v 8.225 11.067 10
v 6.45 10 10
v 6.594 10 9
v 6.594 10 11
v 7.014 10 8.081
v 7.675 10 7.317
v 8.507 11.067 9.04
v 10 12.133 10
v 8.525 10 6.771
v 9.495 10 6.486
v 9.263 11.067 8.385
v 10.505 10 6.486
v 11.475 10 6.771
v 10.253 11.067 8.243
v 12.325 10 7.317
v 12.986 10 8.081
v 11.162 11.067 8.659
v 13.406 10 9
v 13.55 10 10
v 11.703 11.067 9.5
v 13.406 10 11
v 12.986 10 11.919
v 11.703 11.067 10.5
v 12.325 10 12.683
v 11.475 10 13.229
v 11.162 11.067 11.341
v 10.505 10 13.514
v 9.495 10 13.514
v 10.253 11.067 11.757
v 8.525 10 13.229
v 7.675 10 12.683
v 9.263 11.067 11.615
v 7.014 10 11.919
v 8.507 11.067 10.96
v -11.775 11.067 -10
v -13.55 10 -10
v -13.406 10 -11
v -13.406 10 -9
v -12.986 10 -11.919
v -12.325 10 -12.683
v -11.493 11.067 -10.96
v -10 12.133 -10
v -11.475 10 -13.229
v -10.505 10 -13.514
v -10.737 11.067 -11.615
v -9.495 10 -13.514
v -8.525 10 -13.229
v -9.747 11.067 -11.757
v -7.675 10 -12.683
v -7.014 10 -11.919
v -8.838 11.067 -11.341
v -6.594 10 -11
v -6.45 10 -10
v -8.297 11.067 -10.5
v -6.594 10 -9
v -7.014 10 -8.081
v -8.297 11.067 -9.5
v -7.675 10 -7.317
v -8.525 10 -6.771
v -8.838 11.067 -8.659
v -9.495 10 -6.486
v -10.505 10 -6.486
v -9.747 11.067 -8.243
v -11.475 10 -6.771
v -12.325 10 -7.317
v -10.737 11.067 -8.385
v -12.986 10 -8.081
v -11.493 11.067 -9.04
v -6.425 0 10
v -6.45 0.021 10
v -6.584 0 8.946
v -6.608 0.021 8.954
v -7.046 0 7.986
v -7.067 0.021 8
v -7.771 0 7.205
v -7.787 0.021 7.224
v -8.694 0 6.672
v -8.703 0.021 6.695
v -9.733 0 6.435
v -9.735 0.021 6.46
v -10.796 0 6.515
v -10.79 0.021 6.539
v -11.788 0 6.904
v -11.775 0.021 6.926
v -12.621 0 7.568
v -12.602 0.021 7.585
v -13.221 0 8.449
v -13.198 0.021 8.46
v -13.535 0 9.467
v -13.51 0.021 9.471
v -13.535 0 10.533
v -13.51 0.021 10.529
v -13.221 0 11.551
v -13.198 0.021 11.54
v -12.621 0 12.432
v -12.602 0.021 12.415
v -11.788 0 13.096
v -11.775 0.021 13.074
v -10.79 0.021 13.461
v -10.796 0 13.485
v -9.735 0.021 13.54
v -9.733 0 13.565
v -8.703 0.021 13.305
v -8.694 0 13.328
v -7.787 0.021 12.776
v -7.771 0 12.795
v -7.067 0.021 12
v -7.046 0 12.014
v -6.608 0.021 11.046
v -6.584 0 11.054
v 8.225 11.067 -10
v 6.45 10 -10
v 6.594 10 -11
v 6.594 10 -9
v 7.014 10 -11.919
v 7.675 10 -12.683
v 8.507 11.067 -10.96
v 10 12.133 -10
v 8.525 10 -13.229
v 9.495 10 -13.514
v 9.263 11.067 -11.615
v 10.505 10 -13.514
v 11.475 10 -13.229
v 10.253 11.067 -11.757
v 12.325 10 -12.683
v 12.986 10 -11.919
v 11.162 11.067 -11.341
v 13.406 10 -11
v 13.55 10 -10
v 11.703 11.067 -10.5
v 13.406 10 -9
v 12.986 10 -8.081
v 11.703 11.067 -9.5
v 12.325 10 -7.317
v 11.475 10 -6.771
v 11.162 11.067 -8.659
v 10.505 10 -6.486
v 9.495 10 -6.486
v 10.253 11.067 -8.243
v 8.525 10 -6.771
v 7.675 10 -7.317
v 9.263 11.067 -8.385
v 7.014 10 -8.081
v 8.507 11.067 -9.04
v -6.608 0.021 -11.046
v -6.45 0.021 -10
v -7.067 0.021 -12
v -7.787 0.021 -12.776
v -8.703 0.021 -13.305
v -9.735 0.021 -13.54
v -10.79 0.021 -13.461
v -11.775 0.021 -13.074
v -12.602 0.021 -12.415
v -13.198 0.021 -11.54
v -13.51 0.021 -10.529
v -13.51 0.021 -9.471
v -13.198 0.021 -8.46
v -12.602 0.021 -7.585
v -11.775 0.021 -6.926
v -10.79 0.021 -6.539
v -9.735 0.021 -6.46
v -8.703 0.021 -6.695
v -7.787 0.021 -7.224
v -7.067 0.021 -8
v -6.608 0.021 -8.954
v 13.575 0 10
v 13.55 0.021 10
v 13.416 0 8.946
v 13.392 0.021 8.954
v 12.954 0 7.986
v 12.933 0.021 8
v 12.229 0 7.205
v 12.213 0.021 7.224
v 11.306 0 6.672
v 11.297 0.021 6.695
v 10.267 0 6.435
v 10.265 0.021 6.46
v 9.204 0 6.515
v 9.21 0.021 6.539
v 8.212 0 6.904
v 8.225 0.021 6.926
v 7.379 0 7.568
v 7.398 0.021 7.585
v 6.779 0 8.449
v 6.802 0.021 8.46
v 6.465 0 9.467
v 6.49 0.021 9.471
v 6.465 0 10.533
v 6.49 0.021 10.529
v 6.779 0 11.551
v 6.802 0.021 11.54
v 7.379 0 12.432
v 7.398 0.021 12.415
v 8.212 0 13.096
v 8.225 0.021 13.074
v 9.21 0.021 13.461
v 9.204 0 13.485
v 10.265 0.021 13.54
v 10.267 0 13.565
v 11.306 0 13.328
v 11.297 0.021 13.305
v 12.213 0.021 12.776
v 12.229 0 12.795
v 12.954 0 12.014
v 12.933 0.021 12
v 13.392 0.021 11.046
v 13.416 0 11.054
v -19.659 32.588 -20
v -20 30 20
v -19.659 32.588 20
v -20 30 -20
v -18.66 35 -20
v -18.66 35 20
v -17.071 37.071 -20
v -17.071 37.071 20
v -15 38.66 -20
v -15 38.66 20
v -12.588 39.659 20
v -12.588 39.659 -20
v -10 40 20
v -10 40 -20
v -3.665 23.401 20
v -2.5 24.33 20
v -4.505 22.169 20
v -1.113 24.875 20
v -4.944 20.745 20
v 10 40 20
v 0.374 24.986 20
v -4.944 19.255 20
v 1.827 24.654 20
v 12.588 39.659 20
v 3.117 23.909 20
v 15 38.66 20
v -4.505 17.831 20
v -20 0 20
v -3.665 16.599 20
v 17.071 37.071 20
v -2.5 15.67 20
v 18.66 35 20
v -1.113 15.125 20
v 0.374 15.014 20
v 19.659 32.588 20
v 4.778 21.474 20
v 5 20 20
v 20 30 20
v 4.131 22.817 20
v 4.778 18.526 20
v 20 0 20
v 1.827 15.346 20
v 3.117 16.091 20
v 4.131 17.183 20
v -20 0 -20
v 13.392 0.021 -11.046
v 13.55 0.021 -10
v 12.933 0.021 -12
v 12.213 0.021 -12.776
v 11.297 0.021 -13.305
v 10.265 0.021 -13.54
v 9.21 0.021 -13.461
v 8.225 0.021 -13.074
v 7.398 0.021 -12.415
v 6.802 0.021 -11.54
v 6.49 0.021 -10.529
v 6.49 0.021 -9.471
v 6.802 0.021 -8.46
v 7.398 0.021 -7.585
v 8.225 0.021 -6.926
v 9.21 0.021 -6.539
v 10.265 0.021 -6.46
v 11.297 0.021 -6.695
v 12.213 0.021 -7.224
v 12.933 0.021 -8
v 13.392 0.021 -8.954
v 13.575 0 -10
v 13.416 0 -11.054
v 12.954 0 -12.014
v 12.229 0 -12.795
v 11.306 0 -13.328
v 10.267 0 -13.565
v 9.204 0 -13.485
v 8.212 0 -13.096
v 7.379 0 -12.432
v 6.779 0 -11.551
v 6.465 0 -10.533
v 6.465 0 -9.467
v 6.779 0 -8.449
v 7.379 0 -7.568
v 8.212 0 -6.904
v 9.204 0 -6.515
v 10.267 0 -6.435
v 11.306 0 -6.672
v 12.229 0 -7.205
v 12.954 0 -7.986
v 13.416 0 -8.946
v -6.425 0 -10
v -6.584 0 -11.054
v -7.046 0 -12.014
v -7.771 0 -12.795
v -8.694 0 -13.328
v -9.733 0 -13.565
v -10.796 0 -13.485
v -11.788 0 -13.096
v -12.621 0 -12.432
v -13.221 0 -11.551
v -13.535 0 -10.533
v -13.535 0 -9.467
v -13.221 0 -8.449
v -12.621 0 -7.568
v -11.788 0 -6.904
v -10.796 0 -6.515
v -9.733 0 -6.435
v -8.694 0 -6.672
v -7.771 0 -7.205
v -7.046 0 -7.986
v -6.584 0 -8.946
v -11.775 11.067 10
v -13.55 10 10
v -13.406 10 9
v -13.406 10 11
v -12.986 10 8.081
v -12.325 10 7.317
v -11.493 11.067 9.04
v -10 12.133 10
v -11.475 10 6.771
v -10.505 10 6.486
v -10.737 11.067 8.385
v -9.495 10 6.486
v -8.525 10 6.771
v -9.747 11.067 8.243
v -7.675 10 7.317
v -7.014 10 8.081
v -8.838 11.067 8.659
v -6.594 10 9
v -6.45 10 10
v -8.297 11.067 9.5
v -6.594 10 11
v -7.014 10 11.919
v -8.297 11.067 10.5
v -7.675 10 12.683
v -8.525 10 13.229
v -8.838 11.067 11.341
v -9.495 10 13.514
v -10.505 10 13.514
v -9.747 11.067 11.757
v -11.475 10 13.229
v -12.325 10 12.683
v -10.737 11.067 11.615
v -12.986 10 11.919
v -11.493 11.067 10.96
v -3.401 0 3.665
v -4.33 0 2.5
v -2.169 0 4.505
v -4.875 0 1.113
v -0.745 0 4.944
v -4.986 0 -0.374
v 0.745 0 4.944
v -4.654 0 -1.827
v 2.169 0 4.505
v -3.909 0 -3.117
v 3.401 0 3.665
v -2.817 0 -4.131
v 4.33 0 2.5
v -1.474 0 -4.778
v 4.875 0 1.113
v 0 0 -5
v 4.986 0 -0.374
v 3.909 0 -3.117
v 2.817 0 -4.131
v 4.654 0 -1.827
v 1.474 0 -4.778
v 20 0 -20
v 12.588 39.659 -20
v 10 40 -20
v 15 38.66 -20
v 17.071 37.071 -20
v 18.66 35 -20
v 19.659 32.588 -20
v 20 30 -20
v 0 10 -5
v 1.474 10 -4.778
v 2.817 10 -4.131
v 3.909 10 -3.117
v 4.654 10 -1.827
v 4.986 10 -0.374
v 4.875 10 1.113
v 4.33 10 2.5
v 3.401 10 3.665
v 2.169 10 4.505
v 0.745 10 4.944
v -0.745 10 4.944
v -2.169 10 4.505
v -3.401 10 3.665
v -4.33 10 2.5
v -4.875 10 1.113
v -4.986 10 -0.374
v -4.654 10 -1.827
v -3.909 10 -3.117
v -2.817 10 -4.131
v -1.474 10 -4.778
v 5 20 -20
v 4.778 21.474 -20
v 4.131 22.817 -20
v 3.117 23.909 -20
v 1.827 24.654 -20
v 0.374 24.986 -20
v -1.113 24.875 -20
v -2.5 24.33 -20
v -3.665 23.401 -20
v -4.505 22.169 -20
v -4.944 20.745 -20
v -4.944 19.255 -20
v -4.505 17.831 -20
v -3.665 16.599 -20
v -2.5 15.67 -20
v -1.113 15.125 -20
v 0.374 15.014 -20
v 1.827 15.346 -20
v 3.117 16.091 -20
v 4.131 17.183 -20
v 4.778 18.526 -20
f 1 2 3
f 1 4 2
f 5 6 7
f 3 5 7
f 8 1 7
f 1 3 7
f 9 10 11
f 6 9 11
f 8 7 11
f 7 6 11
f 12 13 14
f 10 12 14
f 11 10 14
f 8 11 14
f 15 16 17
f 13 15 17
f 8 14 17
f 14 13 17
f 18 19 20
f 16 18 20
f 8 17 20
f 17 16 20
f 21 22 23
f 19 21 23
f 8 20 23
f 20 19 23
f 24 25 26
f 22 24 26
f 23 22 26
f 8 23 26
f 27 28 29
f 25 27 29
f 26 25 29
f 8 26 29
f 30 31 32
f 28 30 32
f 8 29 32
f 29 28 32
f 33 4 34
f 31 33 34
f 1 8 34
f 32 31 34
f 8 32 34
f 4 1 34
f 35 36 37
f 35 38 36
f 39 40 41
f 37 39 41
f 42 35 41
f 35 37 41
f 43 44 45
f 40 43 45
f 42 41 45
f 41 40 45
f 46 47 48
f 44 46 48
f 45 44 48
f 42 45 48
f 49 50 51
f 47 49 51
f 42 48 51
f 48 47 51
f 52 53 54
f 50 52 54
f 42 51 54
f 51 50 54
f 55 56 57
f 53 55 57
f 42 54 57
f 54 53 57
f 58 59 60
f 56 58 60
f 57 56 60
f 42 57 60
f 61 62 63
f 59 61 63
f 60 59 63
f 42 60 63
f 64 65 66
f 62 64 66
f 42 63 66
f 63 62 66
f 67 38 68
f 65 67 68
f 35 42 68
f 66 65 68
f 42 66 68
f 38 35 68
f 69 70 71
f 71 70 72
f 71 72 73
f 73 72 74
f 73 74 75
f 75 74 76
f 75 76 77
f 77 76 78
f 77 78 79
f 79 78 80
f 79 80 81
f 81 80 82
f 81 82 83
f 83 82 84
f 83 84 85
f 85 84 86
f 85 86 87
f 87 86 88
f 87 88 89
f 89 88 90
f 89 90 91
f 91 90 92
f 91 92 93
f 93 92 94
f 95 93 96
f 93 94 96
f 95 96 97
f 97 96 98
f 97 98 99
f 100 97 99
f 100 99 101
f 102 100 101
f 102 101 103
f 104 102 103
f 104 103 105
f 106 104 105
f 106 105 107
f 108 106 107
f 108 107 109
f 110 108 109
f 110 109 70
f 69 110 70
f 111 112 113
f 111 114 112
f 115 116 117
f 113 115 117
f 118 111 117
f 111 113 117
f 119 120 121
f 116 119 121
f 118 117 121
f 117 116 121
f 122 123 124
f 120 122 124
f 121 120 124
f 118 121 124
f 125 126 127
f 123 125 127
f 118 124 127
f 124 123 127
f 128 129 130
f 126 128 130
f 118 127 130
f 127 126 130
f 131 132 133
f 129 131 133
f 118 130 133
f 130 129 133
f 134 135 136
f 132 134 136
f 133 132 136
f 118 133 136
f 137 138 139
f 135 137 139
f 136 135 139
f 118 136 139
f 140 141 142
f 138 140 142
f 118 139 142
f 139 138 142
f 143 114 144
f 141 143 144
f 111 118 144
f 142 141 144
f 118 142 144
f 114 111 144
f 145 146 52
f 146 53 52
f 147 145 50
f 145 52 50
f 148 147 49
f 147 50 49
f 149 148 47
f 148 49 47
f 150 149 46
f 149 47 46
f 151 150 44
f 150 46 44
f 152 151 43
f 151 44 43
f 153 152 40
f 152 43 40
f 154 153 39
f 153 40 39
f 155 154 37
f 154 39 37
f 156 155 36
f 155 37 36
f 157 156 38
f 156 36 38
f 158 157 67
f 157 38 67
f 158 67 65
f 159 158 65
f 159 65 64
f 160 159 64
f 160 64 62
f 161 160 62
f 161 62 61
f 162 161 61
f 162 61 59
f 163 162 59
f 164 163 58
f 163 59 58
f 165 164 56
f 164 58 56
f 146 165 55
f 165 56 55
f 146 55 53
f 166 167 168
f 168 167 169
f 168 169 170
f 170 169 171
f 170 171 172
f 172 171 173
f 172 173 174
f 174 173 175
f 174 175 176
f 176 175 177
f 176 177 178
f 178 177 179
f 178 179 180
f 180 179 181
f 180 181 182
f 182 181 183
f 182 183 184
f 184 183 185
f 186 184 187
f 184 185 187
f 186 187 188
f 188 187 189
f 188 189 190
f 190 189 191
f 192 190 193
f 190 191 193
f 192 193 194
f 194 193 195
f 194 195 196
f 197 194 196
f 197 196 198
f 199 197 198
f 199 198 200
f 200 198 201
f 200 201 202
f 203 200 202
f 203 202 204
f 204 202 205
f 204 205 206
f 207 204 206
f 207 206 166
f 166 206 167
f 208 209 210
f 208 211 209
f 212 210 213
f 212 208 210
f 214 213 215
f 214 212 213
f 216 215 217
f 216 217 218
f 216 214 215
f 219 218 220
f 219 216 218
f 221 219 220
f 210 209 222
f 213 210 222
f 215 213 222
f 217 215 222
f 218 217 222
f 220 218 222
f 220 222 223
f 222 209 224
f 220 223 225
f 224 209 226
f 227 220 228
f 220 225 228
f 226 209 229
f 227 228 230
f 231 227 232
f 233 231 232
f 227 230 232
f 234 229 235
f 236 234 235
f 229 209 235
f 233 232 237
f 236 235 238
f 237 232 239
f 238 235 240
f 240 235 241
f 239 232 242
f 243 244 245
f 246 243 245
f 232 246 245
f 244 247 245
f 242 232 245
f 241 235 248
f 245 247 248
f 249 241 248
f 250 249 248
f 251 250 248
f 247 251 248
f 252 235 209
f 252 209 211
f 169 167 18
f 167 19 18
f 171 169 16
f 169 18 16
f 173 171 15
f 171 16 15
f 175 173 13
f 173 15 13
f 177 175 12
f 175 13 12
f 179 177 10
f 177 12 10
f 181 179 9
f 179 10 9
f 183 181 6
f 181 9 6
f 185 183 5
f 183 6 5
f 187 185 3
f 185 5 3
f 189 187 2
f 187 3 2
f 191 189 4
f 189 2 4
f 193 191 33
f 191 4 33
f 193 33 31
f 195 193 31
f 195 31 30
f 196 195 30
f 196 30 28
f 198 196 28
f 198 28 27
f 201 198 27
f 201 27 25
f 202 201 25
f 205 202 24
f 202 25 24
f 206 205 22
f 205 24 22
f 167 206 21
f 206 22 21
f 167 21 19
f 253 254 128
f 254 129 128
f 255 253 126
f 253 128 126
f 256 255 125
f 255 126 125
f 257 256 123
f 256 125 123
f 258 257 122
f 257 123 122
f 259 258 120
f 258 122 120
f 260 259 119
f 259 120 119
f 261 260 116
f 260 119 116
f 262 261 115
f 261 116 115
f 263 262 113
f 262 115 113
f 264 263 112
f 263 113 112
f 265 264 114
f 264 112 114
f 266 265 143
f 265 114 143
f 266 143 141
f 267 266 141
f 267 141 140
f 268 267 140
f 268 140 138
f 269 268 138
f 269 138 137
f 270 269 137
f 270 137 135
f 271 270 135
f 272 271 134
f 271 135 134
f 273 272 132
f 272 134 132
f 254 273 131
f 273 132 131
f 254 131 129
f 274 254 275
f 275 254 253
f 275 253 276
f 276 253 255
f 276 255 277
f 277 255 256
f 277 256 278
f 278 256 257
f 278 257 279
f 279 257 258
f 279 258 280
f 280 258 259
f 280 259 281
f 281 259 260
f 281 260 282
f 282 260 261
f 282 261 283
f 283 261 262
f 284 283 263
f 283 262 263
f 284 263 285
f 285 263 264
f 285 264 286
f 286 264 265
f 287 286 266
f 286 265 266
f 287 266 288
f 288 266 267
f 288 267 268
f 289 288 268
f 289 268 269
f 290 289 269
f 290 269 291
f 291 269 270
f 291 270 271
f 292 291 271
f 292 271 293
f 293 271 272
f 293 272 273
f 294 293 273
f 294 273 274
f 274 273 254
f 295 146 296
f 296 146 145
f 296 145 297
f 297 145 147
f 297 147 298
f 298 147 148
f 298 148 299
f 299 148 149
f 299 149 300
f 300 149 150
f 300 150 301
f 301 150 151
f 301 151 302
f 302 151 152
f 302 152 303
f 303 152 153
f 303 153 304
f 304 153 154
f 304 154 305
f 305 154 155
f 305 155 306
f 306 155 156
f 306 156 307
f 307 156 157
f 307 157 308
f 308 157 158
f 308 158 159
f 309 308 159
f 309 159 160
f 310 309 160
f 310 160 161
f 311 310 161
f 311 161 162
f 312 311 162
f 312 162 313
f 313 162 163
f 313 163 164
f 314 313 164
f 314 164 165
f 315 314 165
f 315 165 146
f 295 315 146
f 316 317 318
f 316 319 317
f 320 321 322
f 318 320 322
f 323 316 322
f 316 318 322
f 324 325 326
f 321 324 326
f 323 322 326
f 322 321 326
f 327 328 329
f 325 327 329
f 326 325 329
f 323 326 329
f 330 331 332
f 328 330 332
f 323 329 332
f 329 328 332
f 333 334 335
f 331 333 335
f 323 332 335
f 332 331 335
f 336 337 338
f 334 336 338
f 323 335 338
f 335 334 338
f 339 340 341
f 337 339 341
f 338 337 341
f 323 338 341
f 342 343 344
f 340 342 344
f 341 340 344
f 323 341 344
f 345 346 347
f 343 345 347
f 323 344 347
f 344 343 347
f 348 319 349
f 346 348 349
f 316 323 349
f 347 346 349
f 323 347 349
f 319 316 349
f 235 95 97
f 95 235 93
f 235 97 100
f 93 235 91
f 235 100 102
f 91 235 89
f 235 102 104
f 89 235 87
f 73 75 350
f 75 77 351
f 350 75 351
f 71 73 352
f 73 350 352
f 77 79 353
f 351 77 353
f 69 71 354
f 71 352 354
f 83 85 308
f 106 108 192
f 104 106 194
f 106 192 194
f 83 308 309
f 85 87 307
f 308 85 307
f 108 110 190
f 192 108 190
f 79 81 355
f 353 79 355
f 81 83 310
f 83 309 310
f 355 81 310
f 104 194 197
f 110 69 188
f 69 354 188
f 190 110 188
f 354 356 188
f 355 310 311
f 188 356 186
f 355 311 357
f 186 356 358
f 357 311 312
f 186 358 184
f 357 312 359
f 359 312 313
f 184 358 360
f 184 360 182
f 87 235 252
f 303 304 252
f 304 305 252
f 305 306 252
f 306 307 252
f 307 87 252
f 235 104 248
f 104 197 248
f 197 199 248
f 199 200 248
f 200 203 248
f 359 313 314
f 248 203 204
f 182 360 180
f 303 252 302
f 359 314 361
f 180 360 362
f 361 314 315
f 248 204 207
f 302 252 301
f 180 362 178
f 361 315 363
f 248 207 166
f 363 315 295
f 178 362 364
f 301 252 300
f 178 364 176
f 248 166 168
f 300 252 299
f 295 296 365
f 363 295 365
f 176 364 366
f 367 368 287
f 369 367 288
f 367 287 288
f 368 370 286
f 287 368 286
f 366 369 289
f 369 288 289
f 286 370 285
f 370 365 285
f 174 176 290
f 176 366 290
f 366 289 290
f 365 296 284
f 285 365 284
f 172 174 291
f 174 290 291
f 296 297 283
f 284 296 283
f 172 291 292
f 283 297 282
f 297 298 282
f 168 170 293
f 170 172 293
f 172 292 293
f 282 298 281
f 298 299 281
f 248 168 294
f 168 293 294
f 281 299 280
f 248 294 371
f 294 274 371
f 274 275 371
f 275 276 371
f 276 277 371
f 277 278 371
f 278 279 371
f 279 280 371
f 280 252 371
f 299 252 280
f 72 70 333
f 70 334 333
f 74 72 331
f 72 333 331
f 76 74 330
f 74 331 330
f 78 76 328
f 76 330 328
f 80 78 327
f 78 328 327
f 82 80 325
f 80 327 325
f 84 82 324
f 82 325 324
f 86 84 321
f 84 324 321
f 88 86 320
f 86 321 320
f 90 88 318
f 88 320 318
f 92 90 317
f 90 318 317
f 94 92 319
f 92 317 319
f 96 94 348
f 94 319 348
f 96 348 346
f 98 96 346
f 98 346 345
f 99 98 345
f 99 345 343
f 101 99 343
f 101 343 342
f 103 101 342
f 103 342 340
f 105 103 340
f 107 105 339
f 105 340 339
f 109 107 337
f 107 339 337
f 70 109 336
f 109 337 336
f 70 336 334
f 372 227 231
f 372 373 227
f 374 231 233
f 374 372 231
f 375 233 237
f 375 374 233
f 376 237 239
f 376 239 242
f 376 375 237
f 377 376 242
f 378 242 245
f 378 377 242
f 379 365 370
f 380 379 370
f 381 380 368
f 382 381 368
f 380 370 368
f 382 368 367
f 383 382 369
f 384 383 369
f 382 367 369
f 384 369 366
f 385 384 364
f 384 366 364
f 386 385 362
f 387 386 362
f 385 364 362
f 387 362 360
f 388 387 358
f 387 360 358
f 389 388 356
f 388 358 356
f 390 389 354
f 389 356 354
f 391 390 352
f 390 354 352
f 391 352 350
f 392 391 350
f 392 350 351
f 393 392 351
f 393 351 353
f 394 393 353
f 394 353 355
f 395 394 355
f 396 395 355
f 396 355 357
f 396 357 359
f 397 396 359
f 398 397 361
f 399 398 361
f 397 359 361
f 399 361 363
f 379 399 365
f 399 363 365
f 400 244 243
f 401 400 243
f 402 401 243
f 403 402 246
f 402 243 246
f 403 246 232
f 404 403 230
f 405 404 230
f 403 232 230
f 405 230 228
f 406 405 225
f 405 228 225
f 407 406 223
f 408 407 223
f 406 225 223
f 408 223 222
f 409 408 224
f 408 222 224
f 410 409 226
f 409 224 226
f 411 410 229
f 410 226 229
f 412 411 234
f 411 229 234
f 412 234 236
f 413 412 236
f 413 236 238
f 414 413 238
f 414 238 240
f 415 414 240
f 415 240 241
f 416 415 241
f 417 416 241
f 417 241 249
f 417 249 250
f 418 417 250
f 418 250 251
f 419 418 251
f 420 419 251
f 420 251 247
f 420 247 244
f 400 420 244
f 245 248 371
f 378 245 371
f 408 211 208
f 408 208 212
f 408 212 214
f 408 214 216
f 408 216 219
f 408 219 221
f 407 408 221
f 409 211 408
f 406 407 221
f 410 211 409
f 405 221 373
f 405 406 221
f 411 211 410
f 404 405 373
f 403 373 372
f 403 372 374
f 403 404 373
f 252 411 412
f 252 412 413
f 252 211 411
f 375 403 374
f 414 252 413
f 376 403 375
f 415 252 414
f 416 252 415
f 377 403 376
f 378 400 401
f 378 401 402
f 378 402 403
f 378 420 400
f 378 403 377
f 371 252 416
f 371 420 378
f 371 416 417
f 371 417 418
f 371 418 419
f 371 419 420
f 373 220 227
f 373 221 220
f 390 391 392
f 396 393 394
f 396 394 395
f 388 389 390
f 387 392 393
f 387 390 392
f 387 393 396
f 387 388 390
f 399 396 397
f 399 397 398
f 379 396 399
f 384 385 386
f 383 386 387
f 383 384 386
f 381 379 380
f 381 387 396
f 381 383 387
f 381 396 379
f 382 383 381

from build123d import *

# Parameters (mm, degrees)
SKETCH1_W                        = 40
SKETCH1_H                        = 40
BOSS_EXTRUDE1_DEPTH              = 40
SKETCH2_R                        = 5
CUT_EXTRUDE1_DEPTH               = 61
FILLET1_R                        = 10
M6_5_CLEARANCE_HOLE1_D           = 7.1
M6_5_CLEARANCE_HOLE1_DEPTH       = 10
M6_5_CLEARANCE_HOLE1_CSINK_D     = 7.15
M6_5_CLEARANCE_HOLE1_CSINK_ANGLE = 100
M6_5_CLEARANCE_HOLE1_TIP         = 2.133055198
SKETCH6_R                        = 5
CUT_EXTRUDE2_DEPTH               = 10


with BuildPart() as part:
    # Sketch1 → Boss-Extrude1 (new body)
    with BuildSketch(Plane(origin=(0, 0, 0), x_dir=(1, 0, 0), z_dir=(0, 1, 0))):
        Rectangle(SKETCH1_W, SKETCH1_H)
    extrude(amount=BOSS_EXTRUDE1_DEPTH)

    # Sketch2 → Cut-Extrude1 (cut, through all)
    with BuildSketch(Plane.XY.offset(20)):
        with Locations((0, 20)):
            Circle(SKETCH2_R)
    extrude(amount=-CUT_EXTRUDE1_DEPTH, mode=Mode.SUBTRACT)

    # Fillet1
    fillet1_edges = [part.edges().sort_by_distance(p)[0] for p in [
        (-20, 40, 0),
        (20, 40, 0),
    ]]
    fillet(fillet1_edges, radius=FILLET1_R)

    # M6.5 Clearance Hole1
    with Locations(Plane(origin=(0, 0, 0), x_dir=(-1, 0, 0), z_dir=(0, -1, 0))):
        with Locations((-10, 10), (10, 10), (-10, -10), (10, -10)):
            CounterSinkHole(M6_5_CLEARANCE_HOLE1_D / 2, M6_5_CLEARANCE_HOLE1_CSINK_D / 2, depth=M6_5_CLEARANCE_HOLE1_DEPTH, counter_sink_angle=M6_5_CLEARANCE_HOLE1_CSINK_ANGLE)
            with Locations((0, 0, -(M6_5_CLEARANCE_HOLE1_DEPTH + M6_5_CLEARANCE_HOLE1_TIP / 2))):  # 118° drill point
                Cone(0, M6_5_CLEARANCE_HOLE1_D / 2, M6_5_CLEARANCE_HOLE1_TIP, mode=Mode.SUBTRACT)

    # Sketch6 → Cut-Extrude2 (cut)
    with BuildSketch(Plane.XZ):
        with Locations(Location((0, 0, 0), (0, 0, 270))):
            Circle(SKETCH6_R)
    extrude(amount=-CUT_EXTRUDE2_DEPTH, mode=Mode.SUBTRACT)


solid = part.part
